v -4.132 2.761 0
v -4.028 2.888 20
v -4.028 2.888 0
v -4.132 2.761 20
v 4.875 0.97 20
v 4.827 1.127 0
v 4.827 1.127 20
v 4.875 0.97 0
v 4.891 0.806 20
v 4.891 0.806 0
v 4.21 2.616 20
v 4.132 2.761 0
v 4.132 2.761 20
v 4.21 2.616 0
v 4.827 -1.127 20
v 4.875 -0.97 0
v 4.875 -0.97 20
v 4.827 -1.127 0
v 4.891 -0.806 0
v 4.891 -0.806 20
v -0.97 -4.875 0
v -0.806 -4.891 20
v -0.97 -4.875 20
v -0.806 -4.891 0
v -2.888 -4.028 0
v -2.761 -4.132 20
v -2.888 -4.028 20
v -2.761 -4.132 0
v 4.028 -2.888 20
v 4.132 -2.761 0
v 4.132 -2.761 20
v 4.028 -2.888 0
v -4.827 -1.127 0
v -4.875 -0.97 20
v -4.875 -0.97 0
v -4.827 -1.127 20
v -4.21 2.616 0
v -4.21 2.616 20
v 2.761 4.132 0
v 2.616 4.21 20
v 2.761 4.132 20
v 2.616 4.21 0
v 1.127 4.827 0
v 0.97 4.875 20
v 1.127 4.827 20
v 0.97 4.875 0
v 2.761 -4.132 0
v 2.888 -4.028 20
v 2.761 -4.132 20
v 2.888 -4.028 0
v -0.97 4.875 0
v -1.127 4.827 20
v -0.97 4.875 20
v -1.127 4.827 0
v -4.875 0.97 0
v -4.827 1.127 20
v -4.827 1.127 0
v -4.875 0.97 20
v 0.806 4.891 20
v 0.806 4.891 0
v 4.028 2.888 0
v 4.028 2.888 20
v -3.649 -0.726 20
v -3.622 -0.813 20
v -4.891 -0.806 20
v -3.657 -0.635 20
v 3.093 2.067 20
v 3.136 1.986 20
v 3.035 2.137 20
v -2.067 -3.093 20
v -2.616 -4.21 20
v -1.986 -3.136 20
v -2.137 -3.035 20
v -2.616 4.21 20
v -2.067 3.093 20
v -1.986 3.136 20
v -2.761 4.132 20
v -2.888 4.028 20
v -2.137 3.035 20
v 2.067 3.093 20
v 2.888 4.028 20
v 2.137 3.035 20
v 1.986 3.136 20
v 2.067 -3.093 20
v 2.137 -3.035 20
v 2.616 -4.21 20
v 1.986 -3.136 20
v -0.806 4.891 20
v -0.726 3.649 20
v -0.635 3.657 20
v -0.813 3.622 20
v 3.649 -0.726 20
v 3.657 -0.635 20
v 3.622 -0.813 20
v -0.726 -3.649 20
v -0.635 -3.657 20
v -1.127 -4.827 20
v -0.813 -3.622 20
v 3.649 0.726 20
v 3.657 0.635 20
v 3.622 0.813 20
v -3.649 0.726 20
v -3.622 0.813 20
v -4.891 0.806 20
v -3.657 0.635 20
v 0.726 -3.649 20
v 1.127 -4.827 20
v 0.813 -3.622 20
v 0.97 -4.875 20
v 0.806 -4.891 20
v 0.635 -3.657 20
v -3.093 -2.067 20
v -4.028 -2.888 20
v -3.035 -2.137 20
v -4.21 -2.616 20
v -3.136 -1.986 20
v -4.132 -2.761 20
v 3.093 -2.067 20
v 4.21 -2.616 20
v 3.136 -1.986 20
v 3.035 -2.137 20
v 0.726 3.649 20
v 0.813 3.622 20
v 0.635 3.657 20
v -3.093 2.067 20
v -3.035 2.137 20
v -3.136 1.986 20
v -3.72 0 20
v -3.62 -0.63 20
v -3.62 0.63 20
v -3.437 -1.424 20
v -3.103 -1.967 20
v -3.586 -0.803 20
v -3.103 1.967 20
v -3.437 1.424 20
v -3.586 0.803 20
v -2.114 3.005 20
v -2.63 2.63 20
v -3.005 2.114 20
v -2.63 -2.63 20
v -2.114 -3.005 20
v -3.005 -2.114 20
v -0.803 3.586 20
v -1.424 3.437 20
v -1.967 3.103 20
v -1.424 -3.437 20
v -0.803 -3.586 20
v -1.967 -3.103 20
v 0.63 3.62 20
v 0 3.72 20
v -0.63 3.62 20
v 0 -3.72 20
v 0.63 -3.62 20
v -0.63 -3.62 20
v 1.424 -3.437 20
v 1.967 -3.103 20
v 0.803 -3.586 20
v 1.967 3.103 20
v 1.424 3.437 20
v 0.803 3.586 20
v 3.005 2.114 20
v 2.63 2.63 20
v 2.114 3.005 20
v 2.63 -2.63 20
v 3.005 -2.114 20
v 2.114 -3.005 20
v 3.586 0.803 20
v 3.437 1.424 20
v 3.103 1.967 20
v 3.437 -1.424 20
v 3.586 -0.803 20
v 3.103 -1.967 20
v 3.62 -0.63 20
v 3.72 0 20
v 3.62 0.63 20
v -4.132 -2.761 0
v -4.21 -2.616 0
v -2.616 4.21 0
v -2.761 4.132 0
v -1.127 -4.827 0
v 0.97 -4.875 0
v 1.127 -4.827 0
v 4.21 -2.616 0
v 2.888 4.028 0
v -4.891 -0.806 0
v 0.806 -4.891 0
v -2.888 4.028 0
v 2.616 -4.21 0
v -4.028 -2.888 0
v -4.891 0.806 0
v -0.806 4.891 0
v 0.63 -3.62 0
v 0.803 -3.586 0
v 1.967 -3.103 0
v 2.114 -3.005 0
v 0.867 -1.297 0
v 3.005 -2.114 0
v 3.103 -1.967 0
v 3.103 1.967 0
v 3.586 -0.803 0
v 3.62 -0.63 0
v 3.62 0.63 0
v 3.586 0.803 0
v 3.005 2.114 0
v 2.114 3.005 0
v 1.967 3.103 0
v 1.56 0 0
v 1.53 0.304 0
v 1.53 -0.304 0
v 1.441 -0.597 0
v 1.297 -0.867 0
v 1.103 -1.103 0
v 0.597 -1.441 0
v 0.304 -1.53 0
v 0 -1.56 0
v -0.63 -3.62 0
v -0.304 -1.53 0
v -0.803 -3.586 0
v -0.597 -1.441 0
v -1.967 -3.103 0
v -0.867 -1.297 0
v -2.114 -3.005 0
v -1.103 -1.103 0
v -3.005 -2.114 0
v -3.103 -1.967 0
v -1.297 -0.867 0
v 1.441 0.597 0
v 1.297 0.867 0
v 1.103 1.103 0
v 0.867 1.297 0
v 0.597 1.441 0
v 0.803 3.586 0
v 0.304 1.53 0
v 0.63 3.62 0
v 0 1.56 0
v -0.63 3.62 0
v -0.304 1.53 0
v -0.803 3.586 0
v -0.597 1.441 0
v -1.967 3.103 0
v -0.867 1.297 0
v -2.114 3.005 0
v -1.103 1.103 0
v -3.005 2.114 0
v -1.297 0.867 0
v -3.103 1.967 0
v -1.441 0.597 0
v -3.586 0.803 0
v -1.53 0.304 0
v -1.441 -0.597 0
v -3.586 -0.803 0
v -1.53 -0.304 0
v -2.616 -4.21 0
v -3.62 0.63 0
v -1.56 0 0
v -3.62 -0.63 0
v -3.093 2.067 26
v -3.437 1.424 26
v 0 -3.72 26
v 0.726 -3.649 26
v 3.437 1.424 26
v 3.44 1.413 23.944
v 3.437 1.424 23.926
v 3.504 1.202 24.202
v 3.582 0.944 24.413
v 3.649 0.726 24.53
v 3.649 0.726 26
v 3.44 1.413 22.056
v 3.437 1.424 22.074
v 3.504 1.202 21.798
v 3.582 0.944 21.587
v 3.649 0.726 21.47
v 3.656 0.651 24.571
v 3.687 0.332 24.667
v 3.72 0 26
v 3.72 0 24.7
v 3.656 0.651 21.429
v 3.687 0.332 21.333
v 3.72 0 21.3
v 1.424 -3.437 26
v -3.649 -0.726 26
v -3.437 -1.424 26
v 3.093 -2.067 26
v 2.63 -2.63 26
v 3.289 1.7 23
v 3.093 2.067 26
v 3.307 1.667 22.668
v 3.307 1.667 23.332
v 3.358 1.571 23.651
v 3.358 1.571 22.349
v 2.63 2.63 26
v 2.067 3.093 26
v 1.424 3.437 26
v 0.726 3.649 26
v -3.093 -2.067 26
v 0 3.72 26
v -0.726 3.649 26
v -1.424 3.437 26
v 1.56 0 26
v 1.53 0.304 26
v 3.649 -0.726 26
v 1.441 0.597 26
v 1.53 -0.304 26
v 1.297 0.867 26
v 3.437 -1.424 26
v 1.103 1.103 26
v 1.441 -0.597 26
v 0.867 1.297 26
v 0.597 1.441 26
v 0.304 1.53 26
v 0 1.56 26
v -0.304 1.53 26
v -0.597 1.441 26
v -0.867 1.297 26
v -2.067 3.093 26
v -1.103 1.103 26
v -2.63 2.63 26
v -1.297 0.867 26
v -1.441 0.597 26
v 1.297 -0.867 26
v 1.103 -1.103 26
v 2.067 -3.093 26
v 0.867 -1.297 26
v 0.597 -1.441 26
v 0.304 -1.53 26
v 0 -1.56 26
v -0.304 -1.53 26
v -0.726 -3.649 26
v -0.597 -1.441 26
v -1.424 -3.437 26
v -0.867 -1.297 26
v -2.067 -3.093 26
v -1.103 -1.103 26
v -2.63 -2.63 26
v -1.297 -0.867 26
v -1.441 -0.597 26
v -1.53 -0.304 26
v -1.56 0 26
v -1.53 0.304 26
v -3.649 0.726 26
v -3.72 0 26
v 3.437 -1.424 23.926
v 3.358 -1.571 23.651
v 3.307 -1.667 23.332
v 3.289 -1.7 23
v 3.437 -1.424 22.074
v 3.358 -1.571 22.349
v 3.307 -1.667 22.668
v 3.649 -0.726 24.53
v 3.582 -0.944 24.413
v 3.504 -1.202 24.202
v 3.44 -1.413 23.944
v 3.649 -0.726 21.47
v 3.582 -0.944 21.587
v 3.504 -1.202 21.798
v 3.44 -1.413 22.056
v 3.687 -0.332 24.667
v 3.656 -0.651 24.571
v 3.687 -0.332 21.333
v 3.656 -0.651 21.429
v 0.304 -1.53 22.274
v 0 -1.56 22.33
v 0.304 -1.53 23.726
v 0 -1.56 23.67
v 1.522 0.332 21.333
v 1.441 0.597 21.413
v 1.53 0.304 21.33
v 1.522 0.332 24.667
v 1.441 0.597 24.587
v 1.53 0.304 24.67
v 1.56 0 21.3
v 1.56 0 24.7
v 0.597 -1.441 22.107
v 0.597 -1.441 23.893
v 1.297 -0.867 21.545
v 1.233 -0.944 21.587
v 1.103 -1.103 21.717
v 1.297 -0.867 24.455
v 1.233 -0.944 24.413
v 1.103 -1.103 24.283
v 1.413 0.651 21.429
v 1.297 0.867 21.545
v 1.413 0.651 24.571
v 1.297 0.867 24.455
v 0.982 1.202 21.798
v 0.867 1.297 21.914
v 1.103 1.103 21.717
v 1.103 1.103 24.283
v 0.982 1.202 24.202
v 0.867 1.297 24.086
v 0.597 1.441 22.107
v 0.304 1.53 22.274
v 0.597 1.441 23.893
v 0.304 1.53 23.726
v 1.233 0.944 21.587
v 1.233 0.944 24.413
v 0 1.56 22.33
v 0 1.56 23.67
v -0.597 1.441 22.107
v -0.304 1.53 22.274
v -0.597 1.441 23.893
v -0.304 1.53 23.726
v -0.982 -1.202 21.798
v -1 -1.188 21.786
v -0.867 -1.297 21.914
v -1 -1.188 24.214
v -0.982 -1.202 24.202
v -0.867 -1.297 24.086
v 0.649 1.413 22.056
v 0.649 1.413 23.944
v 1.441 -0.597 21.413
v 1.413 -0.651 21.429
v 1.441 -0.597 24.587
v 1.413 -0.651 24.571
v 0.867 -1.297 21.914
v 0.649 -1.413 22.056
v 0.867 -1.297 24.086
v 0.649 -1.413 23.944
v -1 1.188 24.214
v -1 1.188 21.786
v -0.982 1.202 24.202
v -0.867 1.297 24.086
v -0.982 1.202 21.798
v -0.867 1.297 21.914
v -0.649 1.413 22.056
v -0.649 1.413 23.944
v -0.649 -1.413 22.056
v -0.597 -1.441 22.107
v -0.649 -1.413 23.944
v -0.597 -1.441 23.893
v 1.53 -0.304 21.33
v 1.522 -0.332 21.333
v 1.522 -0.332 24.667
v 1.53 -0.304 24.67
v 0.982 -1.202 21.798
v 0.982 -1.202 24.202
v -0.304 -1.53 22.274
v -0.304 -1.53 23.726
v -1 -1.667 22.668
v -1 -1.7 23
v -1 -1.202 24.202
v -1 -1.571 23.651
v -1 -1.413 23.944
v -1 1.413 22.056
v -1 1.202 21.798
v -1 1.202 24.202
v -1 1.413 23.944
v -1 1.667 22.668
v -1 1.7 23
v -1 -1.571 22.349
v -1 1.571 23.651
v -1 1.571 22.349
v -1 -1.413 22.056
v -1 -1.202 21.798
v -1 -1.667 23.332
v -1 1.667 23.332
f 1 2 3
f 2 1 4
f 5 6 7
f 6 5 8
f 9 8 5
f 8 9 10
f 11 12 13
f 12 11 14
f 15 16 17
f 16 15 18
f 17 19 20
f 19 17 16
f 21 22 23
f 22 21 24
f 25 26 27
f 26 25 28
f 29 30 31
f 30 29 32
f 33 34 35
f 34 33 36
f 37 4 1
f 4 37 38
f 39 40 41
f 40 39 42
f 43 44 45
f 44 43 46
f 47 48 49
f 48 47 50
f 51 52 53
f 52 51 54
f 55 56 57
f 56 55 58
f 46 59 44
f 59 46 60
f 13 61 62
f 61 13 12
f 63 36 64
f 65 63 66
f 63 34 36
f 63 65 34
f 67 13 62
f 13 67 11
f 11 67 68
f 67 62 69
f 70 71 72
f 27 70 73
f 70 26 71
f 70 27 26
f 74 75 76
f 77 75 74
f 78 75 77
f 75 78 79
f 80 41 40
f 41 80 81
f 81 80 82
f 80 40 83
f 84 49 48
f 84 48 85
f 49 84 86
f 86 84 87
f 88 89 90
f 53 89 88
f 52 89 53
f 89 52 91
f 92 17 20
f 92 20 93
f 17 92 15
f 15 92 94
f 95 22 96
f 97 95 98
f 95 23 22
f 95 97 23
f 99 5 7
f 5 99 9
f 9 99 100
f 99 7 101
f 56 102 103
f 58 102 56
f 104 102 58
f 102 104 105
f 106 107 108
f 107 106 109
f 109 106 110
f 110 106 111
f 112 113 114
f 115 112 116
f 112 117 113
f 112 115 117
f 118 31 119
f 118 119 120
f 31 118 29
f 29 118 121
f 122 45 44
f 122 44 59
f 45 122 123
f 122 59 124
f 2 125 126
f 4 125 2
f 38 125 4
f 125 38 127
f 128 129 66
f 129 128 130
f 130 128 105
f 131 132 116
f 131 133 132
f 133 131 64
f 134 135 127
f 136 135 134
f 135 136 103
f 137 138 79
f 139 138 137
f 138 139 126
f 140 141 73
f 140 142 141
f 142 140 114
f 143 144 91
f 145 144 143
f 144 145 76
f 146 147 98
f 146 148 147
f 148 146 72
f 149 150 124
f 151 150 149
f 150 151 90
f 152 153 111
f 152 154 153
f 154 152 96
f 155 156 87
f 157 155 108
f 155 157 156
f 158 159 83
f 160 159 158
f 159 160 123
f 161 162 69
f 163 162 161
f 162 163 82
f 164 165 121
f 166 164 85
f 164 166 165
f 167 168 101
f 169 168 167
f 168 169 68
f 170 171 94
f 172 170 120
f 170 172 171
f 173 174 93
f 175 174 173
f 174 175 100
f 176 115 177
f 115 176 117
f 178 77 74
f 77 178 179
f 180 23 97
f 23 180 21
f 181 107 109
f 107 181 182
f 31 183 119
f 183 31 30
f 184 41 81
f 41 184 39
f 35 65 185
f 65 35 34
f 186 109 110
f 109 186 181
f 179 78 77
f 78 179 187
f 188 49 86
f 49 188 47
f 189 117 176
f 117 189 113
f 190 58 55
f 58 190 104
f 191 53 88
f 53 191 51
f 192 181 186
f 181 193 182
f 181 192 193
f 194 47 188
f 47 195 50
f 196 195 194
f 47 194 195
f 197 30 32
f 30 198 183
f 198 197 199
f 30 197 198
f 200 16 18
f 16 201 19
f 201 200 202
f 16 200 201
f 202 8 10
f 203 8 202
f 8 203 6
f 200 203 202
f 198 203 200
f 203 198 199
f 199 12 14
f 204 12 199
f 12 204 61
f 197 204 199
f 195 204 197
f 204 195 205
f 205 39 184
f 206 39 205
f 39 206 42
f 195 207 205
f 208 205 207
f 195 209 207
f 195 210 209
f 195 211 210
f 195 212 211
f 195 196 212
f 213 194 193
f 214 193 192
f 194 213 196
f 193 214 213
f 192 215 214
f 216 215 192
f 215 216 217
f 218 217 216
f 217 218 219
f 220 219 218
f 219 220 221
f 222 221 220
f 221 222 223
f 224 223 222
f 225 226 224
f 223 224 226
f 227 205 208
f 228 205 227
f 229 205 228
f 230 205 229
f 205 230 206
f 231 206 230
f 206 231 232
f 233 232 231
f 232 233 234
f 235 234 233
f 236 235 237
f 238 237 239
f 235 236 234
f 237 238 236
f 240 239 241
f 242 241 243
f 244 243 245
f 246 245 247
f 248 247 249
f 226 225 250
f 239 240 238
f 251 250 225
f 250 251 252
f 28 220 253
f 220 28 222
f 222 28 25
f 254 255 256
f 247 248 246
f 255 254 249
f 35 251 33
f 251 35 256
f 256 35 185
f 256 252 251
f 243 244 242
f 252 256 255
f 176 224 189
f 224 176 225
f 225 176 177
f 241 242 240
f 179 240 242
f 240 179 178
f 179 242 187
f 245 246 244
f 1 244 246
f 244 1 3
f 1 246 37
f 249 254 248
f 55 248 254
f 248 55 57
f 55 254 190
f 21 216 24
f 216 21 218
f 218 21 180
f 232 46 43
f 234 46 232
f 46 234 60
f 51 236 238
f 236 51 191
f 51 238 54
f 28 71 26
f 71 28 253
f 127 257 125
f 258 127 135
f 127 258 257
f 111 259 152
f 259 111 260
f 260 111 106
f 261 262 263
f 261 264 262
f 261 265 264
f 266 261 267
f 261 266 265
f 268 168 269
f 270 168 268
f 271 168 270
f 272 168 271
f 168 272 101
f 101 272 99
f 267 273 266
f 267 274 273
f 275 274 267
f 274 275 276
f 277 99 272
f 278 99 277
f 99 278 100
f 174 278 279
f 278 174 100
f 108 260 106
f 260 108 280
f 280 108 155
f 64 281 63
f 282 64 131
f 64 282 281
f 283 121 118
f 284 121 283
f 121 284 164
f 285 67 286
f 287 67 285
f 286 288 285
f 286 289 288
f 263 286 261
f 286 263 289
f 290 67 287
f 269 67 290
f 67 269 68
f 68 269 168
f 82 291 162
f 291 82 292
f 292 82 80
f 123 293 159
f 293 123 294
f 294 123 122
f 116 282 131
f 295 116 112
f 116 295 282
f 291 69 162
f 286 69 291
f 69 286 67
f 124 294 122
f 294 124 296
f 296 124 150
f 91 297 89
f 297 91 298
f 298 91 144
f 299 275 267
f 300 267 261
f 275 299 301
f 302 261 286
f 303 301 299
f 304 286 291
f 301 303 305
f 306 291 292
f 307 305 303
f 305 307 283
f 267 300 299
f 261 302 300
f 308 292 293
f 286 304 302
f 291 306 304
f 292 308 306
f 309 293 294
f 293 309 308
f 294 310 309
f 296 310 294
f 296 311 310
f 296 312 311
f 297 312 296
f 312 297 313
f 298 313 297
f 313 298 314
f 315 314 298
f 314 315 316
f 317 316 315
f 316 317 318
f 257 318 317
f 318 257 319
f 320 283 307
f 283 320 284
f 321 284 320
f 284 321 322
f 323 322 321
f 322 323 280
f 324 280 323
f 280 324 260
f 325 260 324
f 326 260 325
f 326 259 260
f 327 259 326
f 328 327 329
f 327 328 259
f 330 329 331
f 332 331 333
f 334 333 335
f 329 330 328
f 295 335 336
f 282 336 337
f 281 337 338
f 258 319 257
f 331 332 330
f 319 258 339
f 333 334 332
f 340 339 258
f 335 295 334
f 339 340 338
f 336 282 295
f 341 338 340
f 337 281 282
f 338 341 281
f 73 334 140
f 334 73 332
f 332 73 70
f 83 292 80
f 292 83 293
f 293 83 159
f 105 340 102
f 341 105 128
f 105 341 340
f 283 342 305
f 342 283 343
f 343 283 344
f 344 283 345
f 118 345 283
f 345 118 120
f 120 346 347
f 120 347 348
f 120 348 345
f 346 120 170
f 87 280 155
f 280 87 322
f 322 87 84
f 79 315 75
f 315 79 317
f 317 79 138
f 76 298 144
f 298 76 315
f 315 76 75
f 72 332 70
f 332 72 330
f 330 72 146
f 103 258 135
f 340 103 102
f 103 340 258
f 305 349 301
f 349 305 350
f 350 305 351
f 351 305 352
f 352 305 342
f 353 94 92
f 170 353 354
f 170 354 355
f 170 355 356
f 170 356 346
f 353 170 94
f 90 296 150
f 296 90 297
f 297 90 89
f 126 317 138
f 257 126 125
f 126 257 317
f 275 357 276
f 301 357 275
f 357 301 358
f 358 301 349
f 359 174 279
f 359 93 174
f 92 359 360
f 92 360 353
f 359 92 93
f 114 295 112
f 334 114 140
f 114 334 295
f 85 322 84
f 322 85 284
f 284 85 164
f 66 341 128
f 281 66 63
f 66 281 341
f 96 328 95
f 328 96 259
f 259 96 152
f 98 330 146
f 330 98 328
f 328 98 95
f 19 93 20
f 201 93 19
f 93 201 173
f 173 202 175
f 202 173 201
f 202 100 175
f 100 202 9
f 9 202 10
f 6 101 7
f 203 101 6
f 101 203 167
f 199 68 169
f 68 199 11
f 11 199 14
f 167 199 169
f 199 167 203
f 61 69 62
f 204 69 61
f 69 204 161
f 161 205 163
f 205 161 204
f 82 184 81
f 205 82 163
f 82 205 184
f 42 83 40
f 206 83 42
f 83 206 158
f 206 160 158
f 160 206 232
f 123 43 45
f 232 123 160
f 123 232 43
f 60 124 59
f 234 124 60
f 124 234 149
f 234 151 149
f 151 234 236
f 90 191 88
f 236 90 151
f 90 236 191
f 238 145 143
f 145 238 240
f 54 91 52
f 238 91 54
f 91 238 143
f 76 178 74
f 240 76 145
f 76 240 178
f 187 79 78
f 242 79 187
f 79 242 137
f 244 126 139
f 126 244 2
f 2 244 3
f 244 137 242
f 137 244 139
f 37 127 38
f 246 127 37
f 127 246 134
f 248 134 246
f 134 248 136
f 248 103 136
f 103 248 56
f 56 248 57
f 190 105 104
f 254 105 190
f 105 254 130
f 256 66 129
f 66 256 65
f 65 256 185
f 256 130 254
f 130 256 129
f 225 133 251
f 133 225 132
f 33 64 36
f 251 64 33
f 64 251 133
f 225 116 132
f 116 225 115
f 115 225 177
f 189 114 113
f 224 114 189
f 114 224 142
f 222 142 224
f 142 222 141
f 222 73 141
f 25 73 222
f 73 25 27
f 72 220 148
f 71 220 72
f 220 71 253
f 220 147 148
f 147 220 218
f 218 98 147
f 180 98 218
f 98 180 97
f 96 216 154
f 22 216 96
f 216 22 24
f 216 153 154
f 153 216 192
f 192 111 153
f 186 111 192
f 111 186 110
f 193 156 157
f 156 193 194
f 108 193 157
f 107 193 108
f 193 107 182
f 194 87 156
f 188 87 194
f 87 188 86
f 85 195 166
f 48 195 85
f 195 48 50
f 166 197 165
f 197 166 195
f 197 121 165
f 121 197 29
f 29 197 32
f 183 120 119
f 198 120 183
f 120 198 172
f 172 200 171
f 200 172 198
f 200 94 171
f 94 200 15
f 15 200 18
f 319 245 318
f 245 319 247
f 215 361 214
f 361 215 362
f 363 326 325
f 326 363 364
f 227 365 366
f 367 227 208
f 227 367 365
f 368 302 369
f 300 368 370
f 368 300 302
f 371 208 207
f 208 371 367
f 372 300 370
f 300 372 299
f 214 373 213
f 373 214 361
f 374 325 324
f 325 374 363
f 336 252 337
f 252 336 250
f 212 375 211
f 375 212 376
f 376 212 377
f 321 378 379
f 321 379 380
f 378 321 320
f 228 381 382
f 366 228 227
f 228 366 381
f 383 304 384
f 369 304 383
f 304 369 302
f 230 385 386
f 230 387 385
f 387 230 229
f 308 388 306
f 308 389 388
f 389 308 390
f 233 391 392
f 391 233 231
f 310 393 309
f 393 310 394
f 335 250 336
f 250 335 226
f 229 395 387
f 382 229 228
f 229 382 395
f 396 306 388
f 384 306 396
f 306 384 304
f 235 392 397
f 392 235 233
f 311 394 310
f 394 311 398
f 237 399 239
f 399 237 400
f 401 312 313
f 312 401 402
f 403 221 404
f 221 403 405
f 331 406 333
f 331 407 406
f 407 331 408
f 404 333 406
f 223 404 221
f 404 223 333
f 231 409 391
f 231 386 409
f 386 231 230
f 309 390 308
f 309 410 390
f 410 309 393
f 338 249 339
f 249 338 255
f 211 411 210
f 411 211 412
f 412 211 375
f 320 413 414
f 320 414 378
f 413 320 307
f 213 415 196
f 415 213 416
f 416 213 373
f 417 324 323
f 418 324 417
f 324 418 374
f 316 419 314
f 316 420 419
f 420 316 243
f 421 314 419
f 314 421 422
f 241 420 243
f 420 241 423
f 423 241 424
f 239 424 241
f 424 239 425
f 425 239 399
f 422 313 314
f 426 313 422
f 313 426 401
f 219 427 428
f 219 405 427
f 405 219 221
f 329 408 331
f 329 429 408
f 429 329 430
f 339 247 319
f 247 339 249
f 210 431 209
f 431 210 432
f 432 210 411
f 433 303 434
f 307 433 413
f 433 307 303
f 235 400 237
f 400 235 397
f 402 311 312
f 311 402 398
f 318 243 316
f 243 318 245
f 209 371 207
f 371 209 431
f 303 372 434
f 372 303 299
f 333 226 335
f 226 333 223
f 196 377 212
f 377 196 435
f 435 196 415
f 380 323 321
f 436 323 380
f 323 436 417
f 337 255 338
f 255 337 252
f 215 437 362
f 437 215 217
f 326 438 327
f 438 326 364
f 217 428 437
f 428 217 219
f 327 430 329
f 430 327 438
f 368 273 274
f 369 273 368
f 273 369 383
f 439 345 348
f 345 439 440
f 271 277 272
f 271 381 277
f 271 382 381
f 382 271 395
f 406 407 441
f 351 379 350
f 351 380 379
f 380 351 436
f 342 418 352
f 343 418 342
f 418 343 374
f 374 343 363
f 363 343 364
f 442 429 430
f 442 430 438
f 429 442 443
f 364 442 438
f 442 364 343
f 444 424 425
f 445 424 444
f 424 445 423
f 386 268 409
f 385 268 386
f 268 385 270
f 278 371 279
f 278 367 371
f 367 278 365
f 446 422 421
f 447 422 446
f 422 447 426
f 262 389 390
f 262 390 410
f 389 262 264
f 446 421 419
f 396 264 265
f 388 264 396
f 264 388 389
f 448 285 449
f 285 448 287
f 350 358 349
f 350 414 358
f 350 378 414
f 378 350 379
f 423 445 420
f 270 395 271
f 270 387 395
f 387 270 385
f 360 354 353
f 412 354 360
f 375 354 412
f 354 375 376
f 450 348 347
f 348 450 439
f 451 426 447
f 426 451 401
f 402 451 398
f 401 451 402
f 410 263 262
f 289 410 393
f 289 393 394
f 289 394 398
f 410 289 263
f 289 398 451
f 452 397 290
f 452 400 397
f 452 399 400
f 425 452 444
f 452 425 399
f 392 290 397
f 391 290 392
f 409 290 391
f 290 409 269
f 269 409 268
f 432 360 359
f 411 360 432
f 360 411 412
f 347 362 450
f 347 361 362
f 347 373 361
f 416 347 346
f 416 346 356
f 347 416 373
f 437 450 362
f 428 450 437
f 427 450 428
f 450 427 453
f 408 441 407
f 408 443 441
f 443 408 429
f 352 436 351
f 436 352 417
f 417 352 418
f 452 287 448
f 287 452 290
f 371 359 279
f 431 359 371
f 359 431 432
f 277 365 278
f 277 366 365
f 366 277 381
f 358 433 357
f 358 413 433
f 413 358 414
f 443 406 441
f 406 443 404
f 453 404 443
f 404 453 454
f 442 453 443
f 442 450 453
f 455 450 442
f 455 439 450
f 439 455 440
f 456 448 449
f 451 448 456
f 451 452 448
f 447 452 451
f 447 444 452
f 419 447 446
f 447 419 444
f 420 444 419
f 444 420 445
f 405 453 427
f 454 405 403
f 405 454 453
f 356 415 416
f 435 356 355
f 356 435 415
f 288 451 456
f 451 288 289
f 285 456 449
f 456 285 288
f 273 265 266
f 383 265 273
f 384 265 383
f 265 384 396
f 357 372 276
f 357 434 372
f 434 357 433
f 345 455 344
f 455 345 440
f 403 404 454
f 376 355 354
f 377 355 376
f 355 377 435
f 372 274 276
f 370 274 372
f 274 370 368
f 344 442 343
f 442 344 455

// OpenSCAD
$fn = 32;

// ----------------------------------------------------------------------
// Timing pulley: GT2 16T, pitch 2 mm, 9.94 mm x 26 mm
// ----------------------------------------------------------------------

// --- parameters (mm) ---
pitch = 2;                // belt pitch
teeth = 16;               // number of grooves
belt_w = 20;              // belt width between the flanges
tip_d = 9.94;             // tip circle diameter
root_d = 8.44;            // groove bottom diameter
groove_h = 0.75;          // groove depth
tooth_w = 1.5;            // groove width at the tip circle
bore_d = 3.12;            // shaft bore
hub_d = 7.44;             // hub diameter
hub_h = 6;                // hub above the flange
bottom_z = 0;             // lowest point of the pulley
top_z = 26;               // highest point of the pulley
set_d = 3.4;              // set screw tap hole

module rim() {
  cylinder(h = belt_w, d = tip_d);
}

module groove_cutter() {
  /* belt tooth groove: deeper than wide, cut through the belt width */
  translate([root_d / 2, 0, 0])
    linear_extrude(height = belt_w)
      polygon(points = [[-0.6, -tooth_w * 0.42], [groove_h + 0.6, -tooth_w * 0.6],
                        [groove_h + 0.6, tooth_w * 0.6], [-0.6, tooth_w * 0.42]]);
}

module hub() {
  translate([0, 0, bottom_z]) cylinder(h = top_z - bottom_z, d = hub_d);
}

difference() {
  union() {
    rim();
    hub();
  }
  for (i = [0 : teeth - 1]) rotate([0, 0, i * 360 / teeth]) groove_cutter();
  translate([0, 0, bottom_z - 1]) cylinder(h = top_z - bottom_z + 2, d = bore_d);
  translate([-1, 0, top_z - hub_h * 0.5]) rotate([0, 90, 0]) cylinder(h = hub_d / 2 + 3, d = set_d);
}
